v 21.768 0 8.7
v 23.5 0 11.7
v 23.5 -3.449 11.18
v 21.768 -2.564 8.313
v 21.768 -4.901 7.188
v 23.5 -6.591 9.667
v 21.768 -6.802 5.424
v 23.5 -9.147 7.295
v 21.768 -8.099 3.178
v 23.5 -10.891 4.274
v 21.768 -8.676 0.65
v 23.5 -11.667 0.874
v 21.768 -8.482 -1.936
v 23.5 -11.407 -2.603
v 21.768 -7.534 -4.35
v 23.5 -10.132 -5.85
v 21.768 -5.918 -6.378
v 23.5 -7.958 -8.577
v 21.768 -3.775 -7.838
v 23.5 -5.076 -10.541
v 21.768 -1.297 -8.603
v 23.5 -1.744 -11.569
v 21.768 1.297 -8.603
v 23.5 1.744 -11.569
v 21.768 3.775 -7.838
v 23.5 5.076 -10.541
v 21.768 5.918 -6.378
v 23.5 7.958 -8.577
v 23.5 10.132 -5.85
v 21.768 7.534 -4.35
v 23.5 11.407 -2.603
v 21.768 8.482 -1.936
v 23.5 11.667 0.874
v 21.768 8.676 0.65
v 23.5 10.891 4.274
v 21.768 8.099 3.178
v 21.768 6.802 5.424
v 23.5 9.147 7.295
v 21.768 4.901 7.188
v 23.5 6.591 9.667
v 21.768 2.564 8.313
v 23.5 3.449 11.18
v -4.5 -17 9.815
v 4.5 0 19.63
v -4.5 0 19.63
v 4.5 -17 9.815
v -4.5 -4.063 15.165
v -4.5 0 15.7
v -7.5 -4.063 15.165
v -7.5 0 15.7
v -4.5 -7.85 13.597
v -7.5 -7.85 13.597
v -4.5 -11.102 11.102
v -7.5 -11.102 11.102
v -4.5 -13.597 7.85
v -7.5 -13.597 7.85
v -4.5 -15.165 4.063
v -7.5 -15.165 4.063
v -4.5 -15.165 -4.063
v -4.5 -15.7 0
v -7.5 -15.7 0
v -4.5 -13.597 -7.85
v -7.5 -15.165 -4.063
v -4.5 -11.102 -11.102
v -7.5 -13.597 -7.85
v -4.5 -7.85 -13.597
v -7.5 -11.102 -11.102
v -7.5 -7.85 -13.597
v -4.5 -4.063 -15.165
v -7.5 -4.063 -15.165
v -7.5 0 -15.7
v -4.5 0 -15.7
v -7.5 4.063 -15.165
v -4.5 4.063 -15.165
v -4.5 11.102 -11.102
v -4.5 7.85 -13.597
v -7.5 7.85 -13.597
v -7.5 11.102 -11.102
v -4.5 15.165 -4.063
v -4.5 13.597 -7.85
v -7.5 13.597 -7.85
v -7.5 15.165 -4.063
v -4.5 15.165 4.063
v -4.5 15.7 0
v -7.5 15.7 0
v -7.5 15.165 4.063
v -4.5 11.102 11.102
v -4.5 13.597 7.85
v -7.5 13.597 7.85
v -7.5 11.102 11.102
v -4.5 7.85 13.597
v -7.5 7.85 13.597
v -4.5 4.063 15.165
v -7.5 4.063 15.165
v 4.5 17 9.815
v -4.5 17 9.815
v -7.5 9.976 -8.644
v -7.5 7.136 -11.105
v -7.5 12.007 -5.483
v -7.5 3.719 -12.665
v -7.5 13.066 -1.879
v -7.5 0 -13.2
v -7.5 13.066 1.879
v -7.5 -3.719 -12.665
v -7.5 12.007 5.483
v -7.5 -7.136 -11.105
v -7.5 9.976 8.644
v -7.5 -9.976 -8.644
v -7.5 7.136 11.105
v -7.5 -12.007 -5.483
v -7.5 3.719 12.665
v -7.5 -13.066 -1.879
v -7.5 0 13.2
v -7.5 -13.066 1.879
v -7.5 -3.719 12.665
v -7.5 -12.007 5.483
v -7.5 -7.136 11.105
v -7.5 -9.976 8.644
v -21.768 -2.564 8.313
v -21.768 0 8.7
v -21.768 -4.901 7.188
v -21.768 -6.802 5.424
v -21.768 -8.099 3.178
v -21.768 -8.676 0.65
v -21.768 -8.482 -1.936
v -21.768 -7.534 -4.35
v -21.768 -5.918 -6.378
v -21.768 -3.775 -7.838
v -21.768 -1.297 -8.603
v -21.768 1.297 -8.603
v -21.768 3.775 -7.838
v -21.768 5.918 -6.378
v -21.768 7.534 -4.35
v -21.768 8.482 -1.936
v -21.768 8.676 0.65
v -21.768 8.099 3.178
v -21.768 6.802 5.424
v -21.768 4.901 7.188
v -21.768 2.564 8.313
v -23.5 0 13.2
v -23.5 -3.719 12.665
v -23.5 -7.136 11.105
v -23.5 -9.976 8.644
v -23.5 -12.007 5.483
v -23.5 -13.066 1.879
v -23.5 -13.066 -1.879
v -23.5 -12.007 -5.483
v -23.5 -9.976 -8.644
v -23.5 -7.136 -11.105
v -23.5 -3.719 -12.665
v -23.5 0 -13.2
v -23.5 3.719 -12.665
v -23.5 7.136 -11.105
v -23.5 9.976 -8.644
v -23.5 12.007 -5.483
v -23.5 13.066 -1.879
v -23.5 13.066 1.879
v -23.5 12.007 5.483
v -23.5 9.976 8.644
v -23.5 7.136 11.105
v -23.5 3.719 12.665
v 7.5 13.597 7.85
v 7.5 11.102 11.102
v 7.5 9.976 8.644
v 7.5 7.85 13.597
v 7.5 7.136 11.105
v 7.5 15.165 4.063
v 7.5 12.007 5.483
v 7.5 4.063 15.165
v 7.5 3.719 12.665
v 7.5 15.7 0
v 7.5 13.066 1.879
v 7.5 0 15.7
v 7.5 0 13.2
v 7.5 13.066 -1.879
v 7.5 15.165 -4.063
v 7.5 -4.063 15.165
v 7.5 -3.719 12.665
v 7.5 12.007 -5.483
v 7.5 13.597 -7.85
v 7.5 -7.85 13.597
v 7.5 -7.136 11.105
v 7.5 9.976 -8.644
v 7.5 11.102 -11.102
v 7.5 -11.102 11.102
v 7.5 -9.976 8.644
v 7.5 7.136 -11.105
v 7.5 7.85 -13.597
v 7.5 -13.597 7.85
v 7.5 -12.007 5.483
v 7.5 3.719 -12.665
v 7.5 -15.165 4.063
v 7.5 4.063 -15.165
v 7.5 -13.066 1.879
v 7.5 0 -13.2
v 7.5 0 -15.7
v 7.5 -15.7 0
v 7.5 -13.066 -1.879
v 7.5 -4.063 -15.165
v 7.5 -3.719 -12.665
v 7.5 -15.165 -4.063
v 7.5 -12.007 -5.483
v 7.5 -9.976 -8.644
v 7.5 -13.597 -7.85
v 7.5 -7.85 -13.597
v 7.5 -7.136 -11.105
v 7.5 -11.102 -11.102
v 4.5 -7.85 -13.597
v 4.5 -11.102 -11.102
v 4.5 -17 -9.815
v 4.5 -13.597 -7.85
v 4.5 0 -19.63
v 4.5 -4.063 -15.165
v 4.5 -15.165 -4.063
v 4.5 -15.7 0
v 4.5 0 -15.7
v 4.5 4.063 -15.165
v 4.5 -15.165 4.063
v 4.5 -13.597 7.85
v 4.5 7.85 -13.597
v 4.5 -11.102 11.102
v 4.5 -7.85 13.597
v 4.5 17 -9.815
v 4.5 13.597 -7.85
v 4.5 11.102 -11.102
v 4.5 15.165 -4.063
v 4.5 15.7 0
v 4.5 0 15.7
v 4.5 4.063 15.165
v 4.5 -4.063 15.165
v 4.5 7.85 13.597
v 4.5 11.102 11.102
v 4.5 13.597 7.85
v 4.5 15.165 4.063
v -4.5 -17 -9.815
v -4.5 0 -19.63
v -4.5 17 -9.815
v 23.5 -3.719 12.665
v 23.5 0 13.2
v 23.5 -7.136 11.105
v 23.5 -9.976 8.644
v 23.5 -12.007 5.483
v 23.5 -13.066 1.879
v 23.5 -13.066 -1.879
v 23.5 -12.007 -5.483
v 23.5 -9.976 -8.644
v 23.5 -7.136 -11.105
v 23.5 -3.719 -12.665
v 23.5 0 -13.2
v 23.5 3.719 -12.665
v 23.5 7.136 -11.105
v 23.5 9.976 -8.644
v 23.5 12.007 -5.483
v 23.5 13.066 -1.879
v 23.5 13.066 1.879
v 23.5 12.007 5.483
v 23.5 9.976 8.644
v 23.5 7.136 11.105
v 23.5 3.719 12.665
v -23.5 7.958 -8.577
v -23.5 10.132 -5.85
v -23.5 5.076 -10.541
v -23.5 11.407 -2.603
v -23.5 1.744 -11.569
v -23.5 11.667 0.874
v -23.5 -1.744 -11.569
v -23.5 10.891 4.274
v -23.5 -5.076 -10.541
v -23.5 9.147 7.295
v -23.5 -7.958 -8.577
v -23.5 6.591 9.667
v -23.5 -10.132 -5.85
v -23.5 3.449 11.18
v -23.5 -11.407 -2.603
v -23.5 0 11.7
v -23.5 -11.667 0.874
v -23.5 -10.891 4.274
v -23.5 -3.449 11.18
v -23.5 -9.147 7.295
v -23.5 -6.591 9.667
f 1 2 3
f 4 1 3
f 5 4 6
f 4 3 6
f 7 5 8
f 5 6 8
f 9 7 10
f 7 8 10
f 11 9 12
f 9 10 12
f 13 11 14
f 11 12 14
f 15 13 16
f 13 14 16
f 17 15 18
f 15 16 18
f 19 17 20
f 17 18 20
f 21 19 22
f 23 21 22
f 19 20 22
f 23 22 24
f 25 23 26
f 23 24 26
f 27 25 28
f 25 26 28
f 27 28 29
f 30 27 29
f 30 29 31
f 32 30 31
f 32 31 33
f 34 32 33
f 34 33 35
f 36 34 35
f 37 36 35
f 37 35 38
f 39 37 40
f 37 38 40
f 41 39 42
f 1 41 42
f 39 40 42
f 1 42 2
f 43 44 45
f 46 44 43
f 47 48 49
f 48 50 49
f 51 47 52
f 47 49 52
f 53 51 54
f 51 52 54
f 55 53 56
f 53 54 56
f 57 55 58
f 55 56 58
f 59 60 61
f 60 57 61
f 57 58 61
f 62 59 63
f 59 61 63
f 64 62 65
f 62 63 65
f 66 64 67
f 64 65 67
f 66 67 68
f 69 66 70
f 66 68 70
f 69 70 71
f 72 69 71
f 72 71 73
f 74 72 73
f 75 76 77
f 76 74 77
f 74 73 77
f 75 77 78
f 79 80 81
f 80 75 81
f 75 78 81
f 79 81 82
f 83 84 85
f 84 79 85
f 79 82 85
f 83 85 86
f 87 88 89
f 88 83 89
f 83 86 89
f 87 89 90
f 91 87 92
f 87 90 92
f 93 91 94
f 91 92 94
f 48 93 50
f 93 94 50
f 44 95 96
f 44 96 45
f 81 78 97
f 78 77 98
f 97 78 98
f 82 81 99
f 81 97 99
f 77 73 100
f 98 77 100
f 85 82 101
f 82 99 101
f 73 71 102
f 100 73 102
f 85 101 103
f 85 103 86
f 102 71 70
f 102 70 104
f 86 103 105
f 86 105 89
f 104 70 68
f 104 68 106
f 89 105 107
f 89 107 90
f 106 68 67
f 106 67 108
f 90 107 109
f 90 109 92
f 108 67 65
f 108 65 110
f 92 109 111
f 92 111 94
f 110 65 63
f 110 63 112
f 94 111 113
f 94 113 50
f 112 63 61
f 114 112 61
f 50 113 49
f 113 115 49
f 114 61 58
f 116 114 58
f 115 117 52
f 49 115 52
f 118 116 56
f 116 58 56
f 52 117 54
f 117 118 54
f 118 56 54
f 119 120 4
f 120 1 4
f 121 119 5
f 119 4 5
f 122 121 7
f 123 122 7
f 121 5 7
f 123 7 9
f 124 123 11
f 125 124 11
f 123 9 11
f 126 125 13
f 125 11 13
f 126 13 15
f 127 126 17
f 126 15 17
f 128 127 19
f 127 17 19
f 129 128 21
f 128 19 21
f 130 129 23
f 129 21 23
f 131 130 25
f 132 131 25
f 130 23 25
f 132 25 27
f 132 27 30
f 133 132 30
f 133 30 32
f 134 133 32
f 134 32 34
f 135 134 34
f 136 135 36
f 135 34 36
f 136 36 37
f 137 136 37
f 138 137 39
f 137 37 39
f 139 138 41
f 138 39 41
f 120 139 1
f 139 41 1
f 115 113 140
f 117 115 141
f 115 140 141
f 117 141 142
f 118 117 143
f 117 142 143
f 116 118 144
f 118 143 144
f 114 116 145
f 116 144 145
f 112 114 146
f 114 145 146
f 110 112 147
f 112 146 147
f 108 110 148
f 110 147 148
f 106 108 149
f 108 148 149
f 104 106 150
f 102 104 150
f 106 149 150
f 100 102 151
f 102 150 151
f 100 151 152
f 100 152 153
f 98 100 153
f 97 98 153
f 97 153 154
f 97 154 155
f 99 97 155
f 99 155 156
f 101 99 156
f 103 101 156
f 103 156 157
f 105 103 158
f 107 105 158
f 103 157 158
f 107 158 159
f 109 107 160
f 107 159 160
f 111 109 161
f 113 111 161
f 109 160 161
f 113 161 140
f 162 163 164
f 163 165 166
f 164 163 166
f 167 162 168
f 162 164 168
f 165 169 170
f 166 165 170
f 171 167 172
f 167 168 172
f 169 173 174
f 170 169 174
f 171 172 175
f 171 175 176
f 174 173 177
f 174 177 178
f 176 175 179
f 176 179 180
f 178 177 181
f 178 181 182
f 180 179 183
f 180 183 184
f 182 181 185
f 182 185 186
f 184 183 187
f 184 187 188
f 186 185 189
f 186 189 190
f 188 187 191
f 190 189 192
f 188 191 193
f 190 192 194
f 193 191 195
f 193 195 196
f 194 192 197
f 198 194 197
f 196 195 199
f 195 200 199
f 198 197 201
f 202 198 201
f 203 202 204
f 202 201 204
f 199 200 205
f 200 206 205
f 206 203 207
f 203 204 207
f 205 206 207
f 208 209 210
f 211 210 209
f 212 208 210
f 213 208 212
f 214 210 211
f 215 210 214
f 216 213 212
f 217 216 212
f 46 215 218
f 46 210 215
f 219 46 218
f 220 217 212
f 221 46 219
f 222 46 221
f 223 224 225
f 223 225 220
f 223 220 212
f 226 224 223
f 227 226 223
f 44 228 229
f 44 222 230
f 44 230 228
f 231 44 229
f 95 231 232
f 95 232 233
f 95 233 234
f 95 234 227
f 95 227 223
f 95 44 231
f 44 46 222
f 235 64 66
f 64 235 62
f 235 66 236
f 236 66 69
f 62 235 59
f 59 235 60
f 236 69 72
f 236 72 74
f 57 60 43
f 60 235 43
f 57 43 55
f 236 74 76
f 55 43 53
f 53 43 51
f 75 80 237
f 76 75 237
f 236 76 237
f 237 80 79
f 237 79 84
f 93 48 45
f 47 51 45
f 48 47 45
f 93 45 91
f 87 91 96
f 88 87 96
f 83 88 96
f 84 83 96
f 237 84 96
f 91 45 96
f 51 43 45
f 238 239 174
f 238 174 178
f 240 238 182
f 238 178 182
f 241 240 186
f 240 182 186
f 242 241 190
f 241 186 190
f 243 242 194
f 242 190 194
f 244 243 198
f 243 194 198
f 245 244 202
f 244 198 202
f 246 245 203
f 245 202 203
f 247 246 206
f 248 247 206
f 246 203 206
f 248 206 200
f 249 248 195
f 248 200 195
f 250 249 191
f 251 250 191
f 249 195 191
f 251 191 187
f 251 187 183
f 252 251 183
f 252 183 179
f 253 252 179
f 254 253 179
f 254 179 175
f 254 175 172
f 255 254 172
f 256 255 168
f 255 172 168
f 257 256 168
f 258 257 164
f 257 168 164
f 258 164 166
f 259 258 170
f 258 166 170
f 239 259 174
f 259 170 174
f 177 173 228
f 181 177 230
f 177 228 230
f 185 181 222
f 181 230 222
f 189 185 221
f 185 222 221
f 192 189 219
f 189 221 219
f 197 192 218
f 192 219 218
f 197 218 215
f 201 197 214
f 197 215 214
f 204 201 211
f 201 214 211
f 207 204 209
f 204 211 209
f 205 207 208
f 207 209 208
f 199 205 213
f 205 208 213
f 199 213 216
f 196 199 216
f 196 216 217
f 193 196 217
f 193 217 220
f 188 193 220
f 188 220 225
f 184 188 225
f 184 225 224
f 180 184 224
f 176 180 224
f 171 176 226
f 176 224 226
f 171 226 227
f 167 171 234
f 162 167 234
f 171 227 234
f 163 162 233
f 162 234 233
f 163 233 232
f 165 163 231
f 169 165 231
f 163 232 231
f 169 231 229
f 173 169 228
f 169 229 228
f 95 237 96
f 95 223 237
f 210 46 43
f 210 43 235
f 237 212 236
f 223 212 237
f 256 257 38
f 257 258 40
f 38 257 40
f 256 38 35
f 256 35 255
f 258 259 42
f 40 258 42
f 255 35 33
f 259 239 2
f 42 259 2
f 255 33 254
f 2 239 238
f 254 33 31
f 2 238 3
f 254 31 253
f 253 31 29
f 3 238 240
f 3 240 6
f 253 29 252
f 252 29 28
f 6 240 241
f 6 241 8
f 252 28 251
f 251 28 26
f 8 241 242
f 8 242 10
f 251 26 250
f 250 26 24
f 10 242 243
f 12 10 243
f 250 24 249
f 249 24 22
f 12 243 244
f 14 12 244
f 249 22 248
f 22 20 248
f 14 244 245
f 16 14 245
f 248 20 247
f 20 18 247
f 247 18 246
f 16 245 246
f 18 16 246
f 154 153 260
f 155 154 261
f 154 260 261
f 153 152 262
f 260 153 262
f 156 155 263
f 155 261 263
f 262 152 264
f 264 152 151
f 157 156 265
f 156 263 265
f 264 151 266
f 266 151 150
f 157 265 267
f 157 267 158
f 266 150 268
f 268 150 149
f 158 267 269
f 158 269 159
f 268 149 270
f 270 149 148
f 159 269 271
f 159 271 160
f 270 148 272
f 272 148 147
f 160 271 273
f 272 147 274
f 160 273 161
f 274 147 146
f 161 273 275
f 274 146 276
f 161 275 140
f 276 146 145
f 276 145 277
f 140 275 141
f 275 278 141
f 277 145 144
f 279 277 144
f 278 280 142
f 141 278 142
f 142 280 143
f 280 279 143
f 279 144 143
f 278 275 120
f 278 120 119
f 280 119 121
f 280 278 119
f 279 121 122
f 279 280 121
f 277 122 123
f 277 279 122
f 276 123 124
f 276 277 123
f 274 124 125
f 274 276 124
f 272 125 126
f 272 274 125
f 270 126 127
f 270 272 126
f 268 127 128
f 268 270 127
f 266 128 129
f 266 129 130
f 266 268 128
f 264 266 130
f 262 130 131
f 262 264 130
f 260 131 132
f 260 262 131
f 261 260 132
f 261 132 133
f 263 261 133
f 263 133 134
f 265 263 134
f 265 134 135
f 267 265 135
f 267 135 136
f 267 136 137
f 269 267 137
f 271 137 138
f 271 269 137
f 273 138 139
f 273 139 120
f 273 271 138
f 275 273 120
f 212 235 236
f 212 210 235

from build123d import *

# Parameters (mm, degrees)
F2_SIZE2 = 3
F2_SIZE  = 1.7320508076
F3_R     = 8.7
F4_DEPTH = 4.5


with BuildPart() as f1:
    # F0 (on Front) → F1 (revolve)
    with BuildSketch(Plane.XZ):
        Polygon((-23.5, 8.7), (23.5, 8.7), (23.5, 13.2), (7.5, 13.2), (7.5, 15.7), (-7.5, 15.7), (-7.5, 13.2), (-23.5, 13.2), align=None)
    revolve(axis=Axis((-11.75, 0, 0), (1, 0, 0)))

    # F2
    f2_edges = [f1.edges().sort_by_distance(p)[0] for p in [
        (23.5, 0, -8.7),
        (-23.5, 0, -8.7),
    ]]
    f2_side = f1.faces().sort_by_distance((0, 0, -8.7))[0]
    chamfer(f2_edges, length=F2_SIZE, length2=F2_SIZE2, reference=f2_side)

    # F3 (on Right) → F4 (join, symmetric)
    with BuildSketch(Plane.YZ):
        Polygon((17, -9.8149545762), (17, 9.8149545762), (0, 19.6299091524), (-17, 9.8149545762), (-17, -9.8149545762), (0, -19.6299091524), align=None)
        Circle(F3_R, mode=Mode.SUBTRACT)
    extrude(amount=F4_DEPTH, both=True)


solid = f1.part
